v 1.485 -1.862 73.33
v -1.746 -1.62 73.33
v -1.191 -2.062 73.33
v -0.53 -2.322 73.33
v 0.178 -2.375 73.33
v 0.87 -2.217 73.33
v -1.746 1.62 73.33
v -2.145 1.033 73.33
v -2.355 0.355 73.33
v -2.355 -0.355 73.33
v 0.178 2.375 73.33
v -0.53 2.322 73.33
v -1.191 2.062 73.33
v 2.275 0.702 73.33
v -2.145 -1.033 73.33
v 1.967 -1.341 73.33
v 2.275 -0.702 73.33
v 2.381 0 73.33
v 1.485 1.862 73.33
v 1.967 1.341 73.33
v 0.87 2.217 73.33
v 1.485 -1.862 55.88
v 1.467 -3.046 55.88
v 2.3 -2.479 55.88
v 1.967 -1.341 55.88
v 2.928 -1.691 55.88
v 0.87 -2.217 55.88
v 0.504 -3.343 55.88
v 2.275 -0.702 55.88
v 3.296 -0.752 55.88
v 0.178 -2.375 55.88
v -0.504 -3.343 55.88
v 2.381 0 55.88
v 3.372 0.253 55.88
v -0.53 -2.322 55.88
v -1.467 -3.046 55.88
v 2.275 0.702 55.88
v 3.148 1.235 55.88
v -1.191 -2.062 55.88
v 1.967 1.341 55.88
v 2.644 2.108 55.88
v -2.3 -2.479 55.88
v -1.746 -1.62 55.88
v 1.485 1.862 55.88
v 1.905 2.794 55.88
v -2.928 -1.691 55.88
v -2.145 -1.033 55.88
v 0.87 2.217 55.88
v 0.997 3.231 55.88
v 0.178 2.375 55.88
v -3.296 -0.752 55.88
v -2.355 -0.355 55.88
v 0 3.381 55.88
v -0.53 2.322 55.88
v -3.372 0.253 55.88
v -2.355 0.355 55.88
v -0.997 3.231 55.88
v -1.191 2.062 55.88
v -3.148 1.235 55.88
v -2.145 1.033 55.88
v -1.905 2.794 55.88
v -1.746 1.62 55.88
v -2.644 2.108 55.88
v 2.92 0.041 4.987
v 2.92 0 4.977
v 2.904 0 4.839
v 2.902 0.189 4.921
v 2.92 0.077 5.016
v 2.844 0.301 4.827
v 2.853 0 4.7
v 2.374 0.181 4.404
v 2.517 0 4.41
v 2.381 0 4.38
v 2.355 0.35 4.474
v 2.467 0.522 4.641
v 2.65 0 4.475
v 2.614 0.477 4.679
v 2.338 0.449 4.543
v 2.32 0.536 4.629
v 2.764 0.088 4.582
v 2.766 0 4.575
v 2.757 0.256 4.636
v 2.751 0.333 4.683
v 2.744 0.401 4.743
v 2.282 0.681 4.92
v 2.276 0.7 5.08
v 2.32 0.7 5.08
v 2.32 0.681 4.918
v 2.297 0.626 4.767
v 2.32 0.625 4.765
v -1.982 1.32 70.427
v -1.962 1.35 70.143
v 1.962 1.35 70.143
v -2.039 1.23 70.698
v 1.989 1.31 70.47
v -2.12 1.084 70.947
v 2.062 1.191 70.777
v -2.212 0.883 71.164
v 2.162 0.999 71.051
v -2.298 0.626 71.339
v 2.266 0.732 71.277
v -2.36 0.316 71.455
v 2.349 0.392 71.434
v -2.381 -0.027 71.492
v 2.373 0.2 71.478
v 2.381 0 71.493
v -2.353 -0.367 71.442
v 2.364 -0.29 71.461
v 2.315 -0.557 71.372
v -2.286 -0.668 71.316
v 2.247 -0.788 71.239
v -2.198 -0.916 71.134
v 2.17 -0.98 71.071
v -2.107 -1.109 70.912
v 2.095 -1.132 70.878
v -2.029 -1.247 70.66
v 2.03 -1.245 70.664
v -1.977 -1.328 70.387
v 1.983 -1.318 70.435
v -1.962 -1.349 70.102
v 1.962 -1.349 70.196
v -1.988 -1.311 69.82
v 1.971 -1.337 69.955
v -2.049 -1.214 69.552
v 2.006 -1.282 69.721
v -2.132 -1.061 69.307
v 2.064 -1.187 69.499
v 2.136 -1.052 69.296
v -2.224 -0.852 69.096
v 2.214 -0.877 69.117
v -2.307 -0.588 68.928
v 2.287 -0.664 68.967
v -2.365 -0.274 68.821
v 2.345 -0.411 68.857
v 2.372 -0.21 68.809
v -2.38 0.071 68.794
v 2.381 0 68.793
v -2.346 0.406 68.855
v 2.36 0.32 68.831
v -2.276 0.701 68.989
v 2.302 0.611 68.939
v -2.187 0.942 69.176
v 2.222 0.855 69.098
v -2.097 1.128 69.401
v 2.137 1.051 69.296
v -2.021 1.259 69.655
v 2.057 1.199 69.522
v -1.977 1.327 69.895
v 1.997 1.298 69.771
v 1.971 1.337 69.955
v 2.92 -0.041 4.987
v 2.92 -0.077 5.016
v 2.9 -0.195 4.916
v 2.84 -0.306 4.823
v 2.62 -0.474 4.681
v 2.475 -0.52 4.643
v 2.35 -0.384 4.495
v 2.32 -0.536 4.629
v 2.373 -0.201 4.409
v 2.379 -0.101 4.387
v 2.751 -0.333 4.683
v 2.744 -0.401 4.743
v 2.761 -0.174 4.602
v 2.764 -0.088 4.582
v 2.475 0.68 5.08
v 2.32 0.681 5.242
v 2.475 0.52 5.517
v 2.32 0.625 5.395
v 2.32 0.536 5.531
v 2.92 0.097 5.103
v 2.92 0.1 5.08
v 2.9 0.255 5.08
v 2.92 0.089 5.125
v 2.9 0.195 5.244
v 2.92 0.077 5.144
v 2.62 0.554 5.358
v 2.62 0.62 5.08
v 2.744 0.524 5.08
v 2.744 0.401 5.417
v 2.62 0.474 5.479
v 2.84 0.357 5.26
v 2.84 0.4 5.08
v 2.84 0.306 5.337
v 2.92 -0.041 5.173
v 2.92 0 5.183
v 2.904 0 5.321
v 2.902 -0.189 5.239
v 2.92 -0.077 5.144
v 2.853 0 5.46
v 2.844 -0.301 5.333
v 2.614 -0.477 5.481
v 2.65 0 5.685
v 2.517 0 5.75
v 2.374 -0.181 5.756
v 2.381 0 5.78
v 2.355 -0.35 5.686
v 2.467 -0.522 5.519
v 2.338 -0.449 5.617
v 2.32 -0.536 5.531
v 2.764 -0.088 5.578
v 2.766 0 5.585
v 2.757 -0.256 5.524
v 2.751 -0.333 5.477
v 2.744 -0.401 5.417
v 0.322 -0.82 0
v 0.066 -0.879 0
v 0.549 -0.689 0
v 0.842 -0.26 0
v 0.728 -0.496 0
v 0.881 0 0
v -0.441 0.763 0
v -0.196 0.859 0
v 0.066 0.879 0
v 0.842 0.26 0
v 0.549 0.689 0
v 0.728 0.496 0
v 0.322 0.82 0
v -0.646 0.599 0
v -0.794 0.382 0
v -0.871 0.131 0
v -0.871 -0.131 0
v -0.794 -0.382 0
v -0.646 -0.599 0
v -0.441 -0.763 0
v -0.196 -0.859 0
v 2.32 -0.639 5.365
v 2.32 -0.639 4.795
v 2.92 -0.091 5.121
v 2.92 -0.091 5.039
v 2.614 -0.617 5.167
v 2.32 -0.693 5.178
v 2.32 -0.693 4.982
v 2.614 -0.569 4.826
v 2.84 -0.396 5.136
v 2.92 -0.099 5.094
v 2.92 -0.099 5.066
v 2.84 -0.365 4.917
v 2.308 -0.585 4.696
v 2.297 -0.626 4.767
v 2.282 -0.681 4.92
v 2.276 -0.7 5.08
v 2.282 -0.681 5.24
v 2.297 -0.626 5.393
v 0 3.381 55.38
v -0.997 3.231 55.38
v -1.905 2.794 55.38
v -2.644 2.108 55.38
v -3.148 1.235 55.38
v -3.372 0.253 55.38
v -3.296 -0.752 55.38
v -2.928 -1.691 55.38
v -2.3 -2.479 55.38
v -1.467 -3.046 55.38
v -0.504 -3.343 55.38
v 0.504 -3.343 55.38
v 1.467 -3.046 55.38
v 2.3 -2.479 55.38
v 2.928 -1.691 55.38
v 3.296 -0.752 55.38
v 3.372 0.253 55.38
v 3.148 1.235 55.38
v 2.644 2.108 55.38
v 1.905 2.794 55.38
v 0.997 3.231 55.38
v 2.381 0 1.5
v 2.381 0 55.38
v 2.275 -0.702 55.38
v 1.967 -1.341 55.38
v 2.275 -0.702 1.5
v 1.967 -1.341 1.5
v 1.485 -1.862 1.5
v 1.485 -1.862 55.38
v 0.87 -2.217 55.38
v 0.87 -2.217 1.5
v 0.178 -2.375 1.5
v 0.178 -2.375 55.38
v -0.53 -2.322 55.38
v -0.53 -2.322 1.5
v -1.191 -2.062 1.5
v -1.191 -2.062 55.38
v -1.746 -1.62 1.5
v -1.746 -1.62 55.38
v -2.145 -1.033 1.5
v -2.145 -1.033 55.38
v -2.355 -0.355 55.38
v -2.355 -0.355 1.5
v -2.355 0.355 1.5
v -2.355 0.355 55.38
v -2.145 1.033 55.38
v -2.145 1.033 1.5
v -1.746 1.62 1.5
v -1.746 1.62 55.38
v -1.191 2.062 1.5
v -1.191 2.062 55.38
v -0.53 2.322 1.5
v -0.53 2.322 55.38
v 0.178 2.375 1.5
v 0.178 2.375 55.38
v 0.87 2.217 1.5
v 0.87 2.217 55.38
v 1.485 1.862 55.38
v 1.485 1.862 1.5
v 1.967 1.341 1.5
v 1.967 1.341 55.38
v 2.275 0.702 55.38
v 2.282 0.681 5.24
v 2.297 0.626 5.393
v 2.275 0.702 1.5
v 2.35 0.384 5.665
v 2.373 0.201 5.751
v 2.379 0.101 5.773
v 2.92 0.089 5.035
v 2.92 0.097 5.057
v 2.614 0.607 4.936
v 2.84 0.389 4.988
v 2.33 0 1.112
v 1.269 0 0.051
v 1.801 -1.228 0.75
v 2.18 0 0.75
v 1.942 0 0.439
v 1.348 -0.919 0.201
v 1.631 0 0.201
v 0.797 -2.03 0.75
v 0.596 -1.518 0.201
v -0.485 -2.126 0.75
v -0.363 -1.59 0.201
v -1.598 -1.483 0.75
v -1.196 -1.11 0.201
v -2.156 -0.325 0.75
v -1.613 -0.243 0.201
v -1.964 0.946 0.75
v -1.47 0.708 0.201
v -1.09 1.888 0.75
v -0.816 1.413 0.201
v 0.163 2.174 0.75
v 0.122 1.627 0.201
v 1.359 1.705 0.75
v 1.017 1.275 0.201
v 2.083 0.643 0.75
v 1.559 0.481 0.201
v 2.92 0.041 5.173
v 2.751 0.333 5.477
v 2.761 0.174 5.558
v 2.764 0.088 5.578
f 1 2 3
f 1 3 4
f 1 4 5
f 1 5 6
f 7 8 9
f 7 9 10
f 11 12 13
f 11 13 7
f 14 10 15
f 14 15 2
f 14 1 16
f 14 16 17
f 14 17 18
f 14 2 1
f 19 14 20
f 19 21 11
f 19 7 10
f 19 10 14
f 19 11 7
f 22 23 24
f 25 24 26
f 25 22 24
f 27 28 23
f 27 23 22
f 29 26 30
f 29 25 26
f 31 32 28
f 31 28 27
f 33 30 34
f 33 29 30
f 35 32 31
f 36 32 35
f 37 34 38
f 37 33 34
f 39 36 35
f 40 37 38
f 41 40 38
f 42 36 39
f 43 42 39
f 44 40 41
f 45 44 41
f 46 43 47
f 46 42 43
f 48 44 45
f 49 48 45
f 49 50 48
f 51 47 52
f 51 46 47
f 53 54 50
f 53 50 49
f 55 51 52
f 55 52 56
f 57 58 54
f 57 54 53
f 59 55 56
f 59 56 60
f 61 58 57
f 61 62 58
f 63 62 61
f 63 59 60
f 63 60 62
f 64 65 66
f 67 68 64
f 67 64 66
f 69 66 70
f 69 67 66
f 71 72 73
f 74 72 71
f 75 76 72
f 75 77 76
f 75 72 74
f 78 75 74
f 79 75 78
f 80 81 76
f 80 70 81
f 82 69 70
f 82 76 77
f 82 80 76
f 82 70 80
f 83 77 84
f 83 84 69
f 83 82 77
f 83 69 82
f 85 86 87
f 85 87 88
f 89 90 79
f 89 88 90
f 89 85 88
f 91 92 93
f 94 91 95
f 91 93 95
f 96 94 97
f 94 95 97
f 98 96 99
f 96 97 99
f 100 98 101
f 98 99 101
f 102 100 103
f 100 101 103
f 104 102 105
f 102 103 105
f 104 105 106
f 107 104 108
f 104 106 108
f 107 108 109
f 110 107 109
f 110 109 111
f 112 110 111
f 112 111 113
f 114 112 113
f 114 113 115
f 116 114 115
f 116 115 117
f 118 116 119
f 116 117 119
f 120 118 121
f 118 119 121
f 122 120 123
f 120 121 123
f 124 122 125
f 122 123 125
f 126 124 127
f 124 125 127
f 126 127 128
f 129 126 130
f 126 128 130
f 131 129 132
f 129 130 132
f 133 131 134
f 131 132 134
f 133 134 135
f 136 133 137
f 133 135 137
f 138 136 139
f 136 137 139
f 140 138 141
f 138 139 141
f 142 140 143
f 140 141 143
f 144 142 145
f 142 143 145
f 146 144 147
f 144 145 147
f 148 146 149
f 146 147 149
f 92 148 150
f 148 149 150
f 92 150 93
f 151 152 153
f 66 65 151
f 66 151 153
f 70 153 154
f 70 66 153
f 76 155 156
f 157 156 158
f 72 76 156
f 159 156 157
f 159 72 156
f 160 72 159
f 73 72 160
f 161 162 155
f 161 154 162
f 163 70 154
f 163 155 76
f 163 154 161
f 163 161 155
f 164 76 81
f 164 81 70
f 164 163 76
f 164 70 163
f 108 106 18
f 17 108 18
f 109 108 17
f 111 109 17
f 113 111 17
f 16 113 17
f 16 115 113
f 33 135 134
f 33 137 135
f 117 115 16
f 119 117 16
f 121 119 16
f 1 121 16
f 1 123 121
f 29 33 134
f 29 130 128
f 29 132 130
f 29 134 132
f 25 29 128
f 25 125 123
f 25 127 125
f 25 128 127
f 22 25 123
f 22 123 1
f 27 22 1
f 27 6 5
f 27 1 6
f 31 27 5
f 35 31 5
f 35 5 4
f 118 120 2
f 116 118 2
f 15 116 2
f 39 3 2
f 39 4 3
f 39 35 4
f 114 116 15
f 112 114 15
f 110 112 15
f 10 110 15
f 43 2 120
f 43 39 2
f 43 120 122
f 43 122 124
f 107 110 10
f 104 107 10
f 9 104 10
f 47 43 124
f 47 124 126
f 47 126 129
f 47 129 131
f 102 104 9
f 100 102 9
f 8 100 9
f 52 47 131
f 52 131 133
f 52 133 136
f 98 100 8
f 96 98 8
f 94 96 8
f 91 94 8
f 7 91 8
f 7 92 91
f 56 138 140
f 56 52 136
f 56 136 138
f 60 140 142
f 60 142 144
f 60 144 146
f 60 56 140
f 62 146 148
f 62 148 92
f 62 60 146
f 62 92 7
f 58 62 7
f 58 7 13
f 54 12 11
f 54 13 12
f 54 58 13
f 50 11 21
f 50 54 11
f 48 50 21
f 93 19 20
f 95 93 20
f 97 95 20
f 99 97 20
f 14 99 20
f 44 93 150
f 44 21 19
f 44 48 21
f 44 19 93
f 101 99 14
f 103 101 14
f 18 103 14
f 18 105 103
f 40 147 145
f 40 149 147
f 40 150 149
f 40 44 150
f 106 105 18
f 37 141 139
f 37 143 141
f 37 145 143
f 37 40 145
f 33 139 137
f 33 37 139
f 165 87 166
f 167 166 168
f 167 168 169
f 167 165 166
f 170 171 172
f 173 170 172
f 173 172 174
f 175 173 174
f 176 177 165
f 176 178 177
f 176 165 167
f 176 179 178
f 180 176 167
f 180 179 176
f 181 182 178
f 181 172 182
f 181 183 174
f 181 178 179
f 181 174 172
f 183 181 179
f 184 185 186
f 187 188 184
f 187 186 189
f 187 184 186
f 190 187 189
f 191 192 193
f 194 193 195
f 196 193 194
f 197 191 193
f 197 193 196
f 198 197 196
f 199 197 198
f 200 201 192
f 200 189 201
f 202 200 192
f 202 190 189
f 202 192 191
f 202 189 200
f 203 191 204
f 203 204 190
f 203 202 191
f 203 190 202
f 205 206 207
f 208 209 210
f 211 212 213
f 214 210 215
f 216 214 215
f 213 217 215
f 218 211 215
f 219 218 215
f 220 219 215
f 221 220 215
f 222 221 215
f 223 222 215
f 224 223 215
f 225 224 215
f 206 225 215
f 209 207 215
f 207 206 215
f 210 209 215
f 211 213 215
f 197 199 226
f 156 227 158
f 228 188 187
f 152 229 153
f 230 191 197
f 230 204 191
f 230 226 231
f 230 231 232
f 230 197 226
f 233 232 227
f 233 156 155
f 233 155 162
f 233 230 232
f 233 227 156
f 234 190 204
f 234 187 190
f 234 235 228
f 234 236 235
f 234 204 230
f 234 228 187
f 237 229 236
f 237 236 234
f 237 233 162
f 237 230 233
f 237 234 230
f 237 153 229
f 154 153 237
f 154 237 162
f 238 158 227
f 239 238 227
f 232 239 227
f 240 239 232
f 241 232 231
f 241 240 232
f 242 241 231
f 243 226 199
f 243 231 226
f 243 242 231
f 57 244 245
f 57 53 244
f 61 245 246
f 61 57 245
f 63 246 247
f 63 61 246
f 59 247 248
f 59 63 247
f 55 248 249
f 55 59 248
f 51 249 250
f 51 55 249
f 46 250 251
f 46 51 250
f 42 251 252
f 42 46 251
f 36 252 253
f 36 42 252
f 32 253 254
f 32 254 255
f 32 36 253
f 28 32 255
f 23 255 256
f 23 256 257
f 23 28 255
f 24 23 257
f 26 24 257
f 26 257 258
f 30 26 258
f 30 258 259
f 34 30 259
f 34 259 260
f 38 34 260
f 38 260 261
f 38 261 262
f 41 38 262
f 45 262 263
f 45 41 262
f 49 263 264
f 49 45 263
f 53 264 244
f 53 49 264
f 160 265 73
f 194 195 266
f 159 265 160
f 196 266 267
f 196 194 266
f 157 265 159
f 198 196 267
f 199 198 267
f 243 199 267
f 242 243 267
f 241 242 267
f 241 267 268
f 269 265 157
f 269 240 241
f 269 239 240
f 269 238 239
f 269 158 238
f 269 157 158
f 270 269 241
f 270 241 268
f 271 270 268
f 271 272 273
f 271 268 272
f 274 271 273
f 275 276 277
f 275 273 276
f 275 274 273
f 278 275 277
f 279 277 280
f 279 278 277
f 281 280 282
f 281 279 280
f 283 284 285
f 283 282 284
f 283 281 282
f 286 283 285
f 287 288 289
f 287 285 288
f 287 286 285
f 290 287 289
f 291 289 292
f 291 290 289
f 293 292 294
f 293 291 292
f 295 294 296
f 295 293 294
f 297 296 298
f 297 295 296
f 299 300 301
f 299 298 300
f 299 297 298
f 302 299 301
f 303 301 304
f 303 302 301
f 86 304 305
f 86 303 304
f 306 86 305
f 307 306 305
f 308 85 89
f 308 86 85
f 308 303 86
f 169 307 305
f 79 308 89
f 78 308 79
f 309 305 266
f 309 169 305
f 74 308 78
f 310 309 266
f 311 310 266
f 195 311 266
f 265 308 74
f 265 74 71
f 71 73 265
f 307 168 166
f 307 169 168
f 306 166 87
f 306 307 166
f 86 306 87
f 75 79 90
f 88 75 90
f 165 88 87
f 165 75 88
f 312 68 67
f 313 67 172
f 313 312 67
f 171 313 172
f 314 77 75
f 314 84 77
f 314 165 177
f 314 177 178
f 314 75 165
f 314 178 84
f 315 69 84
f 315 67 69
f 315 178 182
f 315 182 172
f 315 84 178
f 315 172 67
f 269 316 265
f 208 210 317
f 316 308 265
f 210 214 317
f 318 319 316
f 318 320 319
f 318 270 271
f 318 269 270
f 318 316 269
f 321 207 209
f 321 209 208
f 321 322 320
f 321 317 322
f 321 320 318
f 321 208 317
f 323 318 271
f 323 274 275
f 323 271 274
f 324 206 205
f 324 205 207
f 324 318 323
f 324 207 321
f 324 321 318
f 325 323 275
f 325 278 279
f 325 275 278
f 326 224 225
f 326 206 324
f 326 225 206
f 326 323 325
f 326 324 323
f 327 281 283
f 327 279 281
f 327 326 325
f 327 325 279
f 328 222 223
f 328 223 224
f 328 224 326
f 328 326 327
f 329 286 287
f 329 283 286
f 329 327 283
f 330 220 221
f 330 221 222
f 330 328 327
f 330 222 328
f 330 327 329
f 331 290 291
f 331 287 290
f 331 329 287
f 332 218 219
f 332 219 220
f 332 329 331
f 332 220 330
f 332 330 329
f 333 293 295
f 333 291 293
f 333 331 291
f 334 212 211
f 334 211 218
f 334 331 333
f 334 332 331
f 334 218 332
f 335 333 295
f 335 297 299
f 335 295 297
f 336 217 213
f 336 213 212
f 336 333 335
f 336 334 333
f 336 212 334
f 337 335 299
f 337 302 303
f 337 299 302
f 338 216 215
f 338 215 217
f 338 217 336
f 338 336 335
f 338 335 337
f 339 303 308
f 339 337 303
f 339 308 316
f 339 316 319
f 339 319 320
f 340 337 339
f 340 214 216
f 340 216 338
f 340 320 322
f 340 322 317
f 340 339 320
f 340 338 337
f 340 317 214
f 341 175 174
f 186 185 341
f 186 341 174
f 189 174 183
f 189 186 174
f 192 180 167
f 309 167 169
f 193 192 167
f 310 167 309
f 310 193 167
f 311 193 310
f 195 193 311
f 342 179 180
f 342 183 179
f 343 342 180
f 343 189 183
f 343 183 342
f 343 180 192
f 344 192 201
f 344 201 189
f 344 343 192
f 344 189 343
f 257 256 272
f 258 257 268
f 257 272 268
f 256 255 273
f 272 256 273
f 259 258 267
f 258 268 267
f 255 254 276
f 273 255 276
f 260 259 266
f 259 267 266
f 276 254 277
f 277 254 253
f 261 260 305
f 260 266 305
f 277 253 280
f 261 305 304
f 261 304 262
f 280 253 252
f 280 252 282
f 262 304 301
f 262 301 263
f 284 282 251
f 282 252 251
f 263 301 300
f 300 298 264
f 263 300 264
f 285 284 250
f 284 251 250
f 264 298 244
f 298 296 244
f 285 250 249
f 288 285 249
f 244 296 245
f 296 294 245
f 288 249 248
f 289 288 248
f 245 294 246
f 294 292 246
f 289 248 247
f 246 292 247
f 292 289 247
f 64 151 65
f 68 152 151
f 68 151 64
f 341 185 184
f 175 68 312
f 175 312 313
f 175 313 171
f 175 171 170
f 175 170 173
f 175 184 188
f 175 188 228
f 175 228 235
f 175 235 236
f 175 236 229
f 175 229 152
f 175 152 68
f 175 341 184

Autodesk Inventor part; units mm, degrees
ref_plane "XZ Plane" through (0, 0, 0) normal (0, 1, 0) x (-1, 0, 0)
ref_plane "XY Plane" through (0, 0, 0) normal (0, 0, 1) x (1, 0, 0)
sketch "Sketch1" plane through (0, 0, 0) normal (0, 0, 1) x (1, 0, 0)
  circle A0 centre (0, 0) radius 2.38125
  dimension "d0" = 4.7625
extrude "Extrusion1" add sketch "Sketch1" along normal blind 73.3298
ref_plane "Work Plane1" through (5, 0, 0) normal (1, 0, 0) x (0, 1, 0)
sketch "Sketch2" plane through (5, 0, 0) normal (1, 0, 0) x (0, 1, 0)
  line L0 (-2.38125, 73.3298) -> (2.38125, 73.3298)
  line L1 (-2.38125, 0) -> (2.38125, 0)
  line L2 (-2.38125, 0) -> (-2.38125, 73.3298)
  line L3 (2.38125, 0) -> (2.38125, 73.3298)
  circle A0 centre (0, 70.142643) radius 1.35
  point P0 (0, 0)
  dimension "d4" = 2.7
extrude "Extrusion2" cut sketch "Sketch2" against normal blind 39.4202 contours A0
sketch "Sketch3" plane through (0, 0, 0) normal (1, 0, 0) x (0, 1, 0)
  arc A0 (-1.35, 70.142643) -> (-1.35, 70.142643) centre (-1.35, 70.142643) ccw
  arc A1 (-1.35, 70.142643) -> (-1.35, 70.142643) centre (-1.35, 70.142643) ccw
  line L0 (-2.38125, 73.3298) -> (2.38125, 73.3298)
  line L1 (-2.38125, 0) -> (2.38125, 0)
  line L2 (2.38125, 0) -> (2.38125, 73.3298)
  line L3 (-2.38125, 0) -> (-2.38125, 73.3298)
  line L4 (2.38125, 55.88) -> (3.38125, 55.88)
  line L5 (3.38125, 55.88) -> (3.38125, 55.38)
  line L6 (3.38125, 55.38) -> (2.38125, 55.38)
  line L7 (2.38125, 55.38) -> (2.38125, 55.88)
  line L8 (0, -14.66596) -> (0, 87.99576)
  point P0 (0, 0)
  dimension "d7" = 1
  dimension "d8" = 0.5
  dimension "d9" = 17.4498
sketch "Sketch3 outline for Revolution1" plane through (0, 0, 0) normal (1, 0, 0) x (0, 1, 0)
  line L0 (3.38125, 55.88) -> (2.38125, 55.88)
  line L1 (3.38125, 55.38) -> (3.38125, 55.88)
  line L2 (2.38125, 55.38) -> (3.38125, 55.38)
  line L3 (2.38125, 55.88) -> (2.38125, 55.38)
revolve "Revolution1" add sketch "Sketch3 outline for Revolution1" angle 360 about axis through (0, 0, -10) along (0, 0, 1)
sketch "Sketch4" plane through (0, 0, 0) normal (1, 0, 0) x (0, 1, 0)
  circle A0 centre (0, 5.08) radius 0.7
  point P0 (0, 0)
  dimension "d11" = 1.4
  dimension "d12" = 5.08
extrude "Extrusion3" add sketch "Sketch4" along normal blind 2.9202
fillet "Fillet1" radius 0.6 1 edges at (2.9202, -0.7, 5.08)
fillet "Fillet2" radius 1.5 1 edges at (-2.3813, 0, 0)
properties part number "launcher.RBFpin"
